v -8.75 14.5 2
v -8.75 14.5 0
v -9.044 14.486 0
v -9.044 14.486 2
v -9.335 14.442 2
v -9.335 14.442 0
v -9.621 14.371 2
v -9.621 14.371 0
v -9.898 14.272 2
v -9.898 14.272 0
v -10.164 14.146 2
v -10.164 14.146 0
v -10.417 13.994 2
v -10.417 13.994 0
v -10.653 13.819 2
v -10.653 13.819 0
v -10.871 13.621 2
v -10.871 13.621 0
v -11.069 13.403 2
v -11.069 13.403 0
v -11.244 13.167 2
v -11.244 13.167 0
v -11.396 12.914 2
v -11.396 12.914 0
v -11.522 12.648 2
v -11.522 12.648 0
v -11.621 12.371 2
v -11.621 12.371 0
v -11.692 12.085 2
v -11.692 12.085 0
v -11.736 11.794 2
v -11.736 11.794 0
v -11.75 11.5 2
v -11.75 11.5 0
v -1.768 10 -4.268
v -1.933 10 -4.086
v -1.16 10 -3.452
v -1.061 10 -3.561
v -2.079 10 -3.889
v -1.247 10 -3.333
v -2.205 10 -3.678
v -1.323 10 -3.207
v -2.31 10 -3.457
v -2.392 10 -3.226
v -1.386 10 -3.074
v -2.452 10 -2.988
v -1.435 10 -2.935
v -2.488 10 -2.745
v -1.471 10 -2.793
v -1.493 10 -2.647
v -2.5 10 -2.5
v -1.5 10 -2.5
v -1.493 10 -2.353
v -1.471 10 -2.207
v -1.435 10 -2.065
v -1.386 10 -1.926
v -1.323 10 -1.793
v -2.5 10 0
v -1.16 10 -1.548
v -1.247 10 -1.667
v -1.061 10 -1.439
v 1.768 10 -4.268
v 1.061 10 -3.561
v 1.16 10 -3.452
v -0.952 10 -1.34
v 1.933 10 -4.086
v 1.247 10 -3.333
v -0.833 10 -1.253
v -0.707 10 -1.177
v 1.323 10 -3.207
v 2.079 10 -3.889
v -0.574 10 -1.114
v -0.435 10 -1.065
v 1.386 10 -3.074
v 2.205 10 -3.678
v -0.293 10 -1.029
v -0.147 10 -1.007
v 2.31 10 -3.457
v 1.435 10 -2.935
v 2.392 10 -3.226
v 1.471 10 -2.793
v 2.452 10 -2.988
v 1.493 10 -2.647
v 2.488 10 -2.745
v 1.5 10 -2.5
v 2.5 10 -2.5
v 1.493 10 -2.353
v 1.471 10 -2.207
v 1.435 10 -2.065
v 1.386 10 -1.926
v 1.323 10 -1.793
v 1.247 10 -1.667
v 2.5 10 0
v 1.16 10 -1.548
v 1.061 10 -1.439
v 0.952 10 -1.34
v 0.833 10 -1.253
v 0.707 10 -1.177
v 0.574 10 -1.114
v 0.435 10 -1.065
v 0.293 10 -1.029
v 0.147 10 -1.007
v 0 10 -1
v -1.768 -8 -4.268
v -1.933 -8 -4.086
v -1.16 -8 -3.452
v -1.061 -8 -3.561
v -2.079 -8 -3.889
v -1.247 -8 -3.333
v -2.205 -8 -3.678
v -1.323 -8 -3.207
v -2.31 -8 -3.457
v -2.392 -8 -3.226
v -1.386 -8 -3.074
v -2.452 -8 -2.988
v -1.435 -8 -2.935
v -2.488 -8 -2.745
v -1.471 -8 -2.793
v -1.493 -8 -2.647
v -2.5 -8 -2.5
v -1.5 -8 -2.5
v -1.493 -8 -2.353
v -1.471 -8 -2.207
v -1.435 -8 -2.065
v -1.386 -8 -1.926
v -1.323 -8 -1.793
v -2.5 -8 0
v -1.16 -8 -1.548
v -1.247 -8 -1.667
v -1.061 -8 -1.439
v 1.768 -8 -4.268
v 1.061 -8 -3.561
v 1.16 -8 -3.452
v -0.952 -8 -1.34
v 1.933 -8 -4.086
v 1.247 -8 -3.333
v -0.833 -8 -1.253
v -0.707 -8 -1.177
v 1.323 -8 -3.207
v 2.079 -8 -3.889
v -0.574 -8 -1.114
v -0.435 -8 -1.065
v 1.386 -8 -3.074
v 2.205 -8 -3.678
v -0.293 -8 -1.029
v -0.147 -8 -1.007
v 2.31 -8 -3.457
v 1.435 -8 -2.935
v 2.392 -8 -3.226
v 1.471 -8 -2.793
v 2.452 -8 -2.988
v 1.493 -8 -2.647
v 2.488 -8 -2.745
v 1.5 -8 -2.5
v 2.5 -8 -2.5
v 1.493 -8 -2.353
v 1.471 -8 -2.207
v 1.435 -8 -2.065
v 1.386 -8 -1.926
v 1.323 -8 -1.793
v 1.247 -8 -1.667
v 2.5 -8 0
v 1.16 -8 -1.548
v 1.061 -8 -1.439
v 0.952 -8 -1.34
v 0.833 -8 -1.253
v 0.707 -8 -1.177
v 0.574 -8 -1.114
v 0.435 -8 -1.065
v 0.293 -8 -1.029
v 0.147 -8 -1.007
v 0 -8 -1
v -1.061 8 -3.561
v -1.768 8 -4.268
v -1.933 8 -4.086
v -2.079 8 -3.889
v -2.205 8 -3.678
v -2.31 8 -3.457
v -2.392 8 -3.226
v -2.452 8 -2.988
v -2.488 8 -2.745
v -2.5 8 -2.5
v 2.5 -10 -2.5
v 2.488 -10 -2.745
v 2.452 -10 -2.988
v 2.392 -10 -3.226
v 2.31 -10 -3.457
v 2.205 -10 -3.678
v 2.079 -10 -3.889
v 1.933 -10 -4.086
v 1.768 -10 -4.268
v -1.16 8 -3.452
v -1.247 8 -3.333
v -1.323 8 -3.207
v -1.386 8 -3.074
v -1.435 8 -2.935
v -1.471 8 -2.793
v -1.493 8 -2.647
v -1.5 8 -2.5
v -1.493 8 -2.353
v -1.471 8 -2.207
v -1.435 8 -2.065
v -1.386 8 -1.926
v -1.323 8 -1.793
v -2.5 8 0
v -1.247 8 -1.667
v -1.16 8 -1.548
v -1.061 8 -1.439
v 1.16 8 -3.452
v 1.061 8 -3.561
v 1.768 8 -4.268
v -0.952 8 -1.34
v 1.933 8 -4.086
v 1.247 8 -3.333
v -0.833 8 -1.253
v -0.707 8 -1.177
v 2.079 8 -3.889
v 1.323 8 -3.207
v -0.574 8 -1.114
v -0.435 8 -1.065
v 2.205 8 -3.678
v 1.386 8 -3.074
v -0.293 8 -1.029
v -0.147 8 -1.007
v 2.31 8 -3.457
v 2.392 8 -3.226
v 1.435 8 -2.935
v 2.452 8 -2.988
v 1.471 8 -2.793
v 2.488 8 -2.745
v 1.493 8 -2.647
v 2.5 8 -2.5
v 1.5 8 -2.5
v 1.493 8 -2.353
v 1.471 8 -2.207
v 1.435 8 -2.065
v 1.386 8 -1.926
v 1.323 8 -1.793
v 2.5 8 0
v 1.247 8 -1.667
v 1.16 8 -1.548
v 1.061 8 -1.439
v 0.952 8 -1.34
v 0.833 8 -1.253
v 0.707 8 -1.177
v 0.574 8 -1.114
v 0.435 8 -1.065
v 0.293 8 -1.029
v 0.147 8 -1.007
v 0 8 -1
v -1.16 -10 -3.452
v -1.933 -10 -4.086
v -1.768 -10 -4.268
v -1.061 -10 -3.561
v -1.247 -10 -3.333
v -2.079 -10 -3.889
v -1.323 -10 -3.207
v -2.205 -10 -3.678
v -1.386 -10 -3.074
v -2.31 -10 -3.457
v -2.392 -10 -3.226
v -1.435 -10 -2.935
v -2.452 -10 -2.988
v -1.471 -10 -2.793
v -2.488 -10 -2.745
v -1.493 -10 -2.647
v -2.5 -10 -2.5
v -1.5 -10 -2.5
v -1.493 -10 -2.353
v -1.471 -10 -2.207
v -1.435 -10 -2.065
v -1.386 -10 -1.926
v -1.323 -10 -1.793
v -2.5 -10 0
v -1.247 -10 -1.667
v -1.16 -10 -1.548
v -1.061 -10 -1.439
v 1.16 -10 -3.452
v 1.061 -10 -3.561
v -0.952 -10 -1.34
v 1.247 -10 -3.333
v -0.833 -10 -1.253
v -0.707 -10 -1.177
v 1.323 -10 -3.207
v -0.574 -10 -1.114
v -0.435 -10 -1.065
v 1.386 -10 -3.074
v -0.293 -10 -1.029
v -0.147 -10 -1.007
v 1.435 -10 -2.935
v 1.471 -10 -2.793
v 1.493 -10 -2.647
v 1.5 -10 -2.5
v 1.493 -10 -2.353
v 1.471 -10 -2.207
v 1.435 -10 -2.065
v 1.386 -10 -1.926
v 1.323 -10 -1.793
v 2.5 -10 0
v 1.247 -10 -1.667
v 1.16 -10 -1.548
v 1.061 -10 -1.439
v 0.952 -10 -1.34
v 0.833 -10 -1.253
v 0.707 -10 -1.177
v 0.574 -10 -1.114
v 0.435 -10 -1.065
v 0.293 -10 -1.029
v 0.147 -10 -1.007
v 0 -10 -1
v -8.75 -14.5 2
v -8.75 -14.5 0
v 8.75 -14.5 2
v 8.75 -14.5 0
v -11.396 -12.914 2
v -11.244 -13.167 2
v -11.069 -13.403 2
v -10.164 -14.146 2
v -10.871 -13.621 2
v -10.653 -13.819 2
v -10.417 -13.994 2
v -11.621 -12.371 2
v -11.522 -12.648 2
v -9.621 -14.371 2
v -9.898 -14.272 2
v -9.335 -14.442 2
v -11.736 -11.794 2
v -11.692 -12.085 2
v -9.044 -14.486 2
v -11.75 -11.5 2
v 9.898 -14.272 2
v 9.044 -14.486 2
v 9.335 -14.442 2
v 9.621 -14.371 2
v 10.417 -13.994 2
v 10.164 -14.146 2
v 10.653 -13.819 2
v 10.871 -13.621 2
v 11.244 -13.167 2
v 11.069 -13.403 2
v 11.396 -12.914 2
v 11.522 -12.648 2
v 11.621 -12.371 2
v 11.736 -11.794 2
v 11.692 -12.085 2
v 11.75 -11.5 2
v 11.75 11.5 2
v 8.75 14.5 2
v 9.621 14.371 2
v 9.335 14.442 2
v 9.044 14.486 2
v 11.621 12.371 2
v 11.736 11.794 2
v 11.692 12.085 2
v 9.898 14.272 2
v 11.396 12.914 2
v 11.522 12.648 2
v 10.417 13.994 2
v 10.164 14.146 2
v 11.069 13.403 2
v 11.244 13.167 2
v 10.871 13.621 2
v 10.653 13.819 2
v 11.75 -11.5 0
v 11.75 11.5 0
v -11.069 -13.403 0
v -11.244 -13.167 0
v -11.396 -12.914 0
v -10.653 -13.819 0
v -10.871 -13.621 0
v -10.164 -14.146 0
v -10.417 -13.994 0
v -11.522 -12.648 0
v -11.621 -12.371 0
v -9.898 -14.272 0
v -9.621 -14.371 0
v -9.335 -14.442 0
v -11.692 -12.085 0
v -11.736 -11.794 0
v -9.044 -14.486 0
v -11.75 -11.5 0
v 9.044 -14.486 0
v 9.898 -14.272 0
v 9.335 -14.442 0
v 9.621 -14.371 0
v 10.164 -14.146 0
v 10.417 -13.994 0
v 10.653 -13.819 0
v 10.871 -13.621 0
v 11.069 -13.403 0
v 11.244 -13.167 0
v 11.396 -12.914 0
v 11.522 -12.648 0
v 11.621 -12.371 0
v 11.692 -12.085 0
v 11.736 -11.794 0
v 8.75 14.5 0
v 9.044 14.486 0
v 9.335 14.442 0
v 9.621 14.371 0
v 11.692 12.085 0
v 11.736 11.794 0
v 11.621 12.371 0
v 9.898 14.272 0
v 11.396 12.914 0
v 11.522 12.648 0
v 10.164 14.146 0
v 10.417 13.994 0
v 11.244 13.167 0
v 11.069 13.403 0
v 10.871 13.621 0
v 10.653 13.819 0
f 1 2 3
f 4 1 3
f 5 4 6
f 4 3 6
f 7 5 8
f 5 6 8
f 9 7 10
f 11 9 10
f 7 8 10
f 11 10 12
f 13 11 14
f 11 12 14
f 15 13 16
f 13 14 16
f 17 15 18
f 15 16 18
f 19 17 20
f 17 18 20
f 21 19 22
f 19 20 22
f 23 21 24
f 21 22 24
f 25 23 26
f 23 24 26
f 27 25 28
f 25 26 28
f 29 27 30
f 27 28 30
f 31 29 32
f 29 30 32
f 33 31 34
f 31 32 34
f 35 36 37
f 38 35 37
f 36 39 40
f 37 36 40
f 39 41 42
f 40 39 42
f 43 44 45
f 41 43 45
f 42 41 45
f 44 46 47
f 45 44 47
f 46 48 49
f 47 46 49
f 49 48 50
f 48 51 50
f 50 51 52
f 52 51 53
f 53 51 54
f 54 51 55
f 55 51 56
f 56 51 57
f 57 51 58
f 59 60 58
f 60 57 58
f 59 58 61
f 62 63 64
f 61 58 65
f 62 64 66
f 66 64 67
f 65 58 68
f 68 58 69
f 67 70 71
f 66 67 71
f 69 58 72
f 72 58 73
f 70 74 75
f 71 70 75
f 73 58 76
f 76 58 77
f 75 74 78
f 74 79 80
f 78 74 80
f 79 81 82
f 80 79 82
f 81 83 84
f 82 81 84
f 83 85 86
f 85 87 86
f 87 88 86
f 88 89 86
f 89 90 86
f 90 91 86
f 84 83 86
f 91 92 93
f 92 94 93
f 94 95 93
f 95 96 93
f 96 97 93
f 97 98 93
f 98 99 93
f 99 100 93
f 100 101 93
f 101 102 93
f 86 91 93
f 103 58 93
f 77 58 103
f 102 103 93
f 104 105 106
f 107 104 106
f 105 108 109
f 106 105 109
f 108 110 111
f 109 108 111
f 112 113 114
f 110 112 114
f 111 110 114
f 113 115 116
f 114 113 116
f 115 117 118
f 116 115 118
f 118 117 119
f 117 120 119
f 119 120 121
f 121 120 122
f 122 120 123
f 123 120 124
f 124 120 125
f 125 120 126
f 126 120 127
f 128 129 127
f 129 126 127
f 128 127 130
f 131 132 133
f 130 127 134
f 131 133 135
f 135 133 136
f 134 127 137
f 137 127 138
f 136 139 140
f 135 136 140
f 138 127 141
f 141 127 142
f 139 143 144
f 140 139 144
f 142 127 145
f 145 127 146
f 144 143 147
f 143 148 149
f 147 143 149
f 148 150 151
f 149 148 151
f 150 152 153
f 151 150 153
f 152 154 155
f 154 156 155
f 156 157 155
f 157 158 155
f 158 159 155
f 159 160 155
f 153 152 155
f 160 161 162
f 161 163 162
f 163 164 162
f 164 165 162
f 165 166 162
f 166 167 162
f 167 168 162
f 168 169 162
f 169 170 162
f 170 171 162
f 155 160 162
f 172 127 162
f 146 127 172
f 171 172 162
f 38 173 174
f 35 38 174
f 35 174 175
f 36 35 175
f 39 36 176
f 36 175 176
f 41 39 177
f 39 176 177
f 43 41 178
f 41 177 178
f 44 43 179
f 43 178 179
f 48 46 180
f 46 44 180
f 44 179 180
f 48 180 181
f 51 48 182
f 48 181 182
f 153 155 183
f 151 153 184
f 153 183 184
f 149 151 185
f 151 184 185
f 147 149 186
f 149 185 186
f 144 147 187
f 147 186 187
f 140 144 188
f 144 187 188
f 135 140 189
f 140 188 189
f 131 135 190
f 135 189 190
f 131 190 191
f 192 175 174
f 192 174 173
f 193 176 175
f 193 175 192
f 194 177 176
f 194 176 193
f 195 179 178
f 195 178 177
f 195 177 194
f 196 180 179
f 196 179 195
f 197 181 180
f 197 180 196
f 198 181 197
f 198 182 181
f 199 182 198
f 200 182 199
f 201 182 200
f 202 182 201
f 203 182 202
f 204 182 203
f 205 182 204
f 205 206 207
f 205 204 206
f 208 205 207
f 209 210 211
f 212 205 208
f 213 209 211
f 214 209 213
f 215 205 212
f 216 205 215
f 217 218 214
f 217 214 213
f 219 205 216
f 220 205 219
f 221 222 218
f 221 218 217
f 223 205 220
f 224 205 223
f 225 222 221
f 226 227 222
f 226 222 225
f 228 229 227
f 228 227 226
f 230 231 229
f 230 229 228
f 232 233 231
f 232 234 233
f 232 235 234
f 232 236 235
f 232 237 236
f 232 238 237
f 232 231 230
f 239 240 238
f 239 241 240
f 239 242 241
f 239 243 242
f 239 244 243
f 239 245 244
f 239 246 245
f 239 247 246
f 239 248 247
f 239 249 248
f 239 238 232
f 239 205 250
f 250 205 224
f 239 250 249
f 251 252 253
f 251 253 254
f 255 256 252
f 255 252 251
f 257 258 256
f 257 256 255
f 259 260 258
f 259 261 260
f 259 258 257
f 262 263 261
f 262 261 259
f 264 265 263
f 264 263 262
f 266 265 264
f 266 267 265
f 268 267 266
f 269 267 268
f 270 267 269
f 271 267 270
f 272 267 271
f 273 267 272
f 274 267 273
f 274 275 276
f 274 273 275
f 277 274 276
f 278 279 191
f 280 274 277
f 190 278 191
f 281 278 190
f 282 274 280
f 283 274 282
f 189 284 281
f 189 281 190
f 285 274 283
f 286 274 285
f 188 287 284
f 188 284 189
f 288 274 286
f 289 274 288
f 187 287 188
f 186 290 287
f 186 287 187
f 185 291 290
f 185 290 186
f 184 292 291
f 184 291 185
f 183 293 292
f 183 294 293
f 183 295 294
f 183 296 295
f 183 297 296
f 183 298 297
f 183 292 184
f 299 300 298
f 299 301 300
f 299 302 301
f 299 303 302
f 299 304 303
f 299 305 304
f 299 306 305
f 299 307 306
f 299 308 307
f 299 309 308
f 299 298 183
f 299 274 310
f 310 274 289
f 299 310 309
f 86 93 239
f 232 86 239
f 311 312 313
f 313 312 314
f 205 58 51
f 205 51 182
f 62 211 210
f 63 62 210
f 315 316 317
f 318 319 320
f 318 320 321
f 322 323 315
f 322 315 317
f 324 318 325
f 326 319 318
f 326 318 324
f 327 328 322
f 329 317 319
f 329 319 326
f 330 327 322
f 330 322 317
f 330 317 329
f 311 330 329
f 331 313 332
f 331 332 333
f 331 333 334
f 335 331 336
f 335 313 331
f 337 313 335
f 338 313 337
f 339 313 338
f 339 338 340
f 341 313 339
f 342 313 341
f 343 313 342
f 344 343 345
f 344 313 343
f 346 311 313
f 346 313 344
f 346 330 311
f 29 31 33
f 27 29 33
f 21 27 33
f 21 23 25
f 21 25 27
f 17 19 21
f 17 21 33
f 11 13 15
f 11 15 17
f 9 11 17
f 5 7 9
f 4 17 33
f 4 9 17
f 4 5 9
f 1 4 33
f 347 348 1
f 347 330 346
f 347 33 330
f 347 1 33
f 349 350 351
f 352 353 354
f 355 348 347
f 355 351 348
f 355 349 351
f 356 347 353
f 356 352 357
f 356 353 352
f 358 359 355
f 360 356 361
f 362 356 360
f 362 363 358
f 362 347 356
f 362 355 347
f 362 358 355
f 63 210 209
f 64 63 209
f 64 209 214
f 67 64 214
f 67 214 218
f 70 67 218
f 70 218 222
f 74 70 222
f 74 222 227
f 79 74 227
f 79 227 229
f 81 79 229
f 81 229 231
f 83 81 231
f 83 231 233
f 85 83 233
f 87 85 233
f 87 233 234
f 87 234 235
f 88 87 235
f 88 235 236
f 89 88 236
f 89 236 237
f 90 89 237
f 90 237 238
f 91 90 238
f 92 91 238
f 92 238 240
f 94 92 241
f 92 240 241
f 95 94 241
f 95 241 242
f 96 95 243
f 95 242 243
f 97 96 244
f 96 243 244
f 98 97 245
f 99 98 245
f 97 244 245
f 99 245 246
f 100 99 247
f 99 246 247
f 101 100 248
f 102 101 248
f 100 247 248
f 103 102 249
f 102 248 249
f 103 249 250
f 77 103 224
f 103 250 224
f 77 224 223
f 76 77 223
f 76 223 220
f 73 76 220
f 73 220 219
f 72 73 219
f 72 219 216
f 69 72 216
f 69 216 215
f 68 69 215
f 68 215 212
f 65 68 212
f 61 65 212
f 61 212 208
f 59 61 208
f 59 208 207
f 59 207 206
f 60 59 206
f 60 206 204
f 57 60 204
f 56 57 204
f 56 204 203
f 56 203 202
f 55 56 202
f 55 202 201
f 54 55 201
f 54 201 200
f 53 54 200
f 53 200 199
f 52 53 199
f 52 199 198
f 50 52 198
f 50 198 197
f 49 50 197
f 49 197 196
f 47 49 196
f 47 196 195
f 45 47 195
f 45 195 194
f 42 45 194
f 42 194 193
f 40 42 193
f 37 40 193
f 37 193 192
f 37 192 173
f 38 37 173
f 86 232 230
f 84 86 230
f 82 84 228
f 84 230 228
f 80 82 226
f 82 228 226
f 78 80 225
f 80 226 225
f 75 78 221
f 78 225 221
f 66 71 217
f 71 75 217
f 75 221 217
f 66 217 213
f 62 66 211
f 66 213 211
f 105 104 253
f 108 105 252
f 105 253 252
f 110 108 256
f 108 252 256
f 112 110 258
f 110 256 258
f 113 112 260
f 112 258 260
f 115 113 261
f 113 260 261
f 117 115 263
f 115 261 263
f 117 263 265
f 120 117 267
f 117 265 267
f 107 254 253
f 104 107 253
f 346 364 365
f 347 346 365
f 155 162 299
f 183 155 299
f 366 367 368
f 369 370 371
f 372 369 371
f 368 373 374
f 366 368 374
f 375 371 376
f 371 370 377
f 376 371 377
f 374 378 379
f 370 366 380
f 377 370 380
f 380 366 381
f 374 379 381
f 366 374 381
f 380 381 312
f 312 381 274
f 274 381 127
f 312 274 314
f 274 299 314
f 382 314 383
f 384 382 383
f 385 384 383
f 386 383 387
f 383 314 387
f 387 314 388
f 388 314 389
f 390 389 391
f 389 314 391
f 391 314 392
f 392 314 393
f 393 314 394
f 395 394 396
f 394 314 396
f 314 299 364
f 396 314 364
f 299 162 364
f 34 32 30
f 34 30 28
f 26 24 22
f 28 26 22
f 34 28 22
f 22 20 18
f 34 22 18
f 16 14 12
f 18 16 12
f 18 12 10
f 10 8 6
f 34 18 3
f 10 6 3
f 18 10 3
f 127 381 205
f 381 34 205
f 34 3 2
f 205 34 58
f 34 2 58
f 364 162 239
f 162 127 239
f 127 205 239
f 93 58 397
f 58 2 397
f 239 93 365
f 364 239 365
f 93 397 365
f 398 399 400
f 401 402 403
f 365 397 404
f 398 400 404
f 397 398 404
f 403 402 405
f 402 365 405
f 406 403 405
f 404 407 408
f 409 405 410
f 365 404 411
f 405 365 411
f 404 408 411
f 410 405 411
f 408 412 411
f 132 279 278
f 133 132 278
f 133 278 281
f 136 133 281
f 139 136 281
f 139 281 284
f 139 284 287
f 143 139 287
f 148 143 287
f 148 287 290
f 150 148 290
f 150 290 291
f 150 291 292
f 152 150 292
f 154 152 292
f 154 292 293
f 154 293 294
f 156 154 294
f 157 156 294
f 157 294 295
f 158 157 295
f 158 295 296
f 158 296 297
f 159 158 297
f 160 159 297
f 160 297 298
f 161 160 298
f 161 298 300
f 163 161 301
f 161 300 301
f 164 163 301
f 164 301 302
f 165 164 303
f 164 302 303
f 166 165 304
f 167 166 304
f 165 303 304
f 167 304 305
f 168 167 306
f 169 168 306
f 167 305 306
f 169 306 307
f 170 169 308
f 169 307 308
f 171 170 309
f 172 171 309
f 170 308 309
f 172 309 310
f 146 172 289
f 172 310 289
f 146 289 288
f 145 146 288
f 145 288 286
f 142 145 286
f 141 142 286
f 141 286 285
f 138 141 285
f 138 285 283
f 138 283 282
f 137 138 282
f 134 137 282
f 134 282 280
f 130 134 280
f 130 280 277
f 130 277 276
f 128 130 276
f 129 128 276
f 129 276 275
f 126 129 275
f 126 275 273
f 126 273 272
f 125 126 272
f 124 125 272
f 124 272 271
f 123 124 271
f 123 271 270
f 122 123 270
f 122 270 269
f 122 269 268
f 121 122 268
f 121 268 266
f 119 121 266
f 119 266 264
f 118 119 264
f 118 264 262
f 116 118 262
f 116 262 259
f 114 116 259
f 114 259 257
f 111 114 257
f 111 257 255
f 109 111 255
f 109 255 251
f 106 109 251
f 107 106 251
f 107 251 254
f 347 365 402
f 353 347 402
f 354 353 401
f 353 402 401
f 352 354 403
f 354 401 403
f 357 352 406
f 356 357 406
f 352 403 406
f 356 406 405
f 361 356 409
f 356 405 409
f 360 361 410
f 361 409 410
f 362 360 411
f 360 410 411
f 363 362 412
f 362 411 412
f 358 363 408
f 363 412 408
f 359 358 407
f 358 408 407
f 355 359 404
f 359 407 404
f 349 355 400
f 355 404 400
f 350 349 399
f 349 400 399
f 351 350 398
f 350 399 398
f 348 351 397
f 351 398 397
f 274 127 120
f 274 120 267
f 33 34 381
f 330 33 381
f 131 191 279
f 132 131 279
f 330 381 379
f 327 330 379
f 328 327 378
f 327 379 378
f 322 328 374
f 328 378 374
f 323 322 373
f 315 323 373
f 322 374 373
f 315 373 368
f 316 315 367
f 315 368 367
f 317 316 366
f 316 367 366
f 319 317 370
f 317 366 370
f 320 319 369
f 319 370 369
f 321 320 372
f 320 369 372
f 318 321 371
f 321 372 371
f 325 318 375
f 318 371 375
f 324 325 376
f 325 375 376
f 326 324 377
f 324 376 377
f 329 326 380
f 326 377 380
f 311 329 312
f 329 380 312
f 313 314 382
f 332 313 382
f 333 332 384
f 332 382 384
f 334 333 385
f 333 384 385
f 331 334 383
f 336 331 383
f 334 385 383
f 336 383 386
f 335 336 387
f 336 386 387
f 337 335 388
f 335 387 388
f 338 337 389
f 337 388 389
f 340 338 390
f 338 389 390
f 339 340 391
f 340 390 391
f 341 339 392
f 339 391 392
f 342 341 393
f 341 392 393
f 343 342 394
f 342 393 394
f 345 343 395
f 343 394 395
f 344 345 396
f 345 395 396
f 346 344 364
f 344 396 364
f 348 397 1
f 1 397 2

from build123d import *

# Parameters (mm, degrees)
F1_DEPTH = 2
F2_W     = 5
F2_H     = 2
F3_DEPTH = 5
F5_DEPTH = 25


with BuildPart() as f1:
    # F0 (on Top) → F1 (new body)
    with BuildSketch(Plane.XY):
        with BuildLine():
            Line((-8.75, -14.5), (8.75, -14.5))
            ThreePointArc((8.75, -14.5), (10.87132, -13.62132), (11.75, -11.5))
            Line((11.75, -11.5), (11.75, 11.5))
            ThreePointArc((11.75, 11.5), (10.87132, 13.62132), (8.75, 14.5))
            Line((8.75, 14.5), (-8.75, 14.5))
            ThreePointArc((-8.75, 14.5), (-10.87132, 13.62132), (-11.75, 11.5))
            Line((-11.75, 11.5), (-11.75, -11.5))
            ThreePointArc((-11.75, -11.5), (-10.87132, -13.62132), (-8.75, -14.5))
        make_face()
    extrude(amount=F1_DEPTH)

    # F2 (on face) → F3 (join)
    with BuildSketch(Plane(origin=(0, 0, 0), x_dir=(1, 0, 0), z_dir=(0, 0, -1))):
        with Locations((0, 9)):
            Rectangle(F2_W, F2_H)
        with Locations((0, -9)):
            Rectangle(F2_W, F2_H)
    extrude(amount=F3_DEPTH)

    # F4 (on face) → F5 (cut)
    with BuildSketch(Plane.XZ.offset(10)):
        with BuildLine():
            ThreePointArc((2.5, -2.5), (2.309699, -3.456709), (1.767767, -4.267767))
            Line((1.767767, -4.267767), (1.06066, -3.56066))
            ThreePointArc((1.06066, -3.56066), (0, -1), (-1.06066, -3.56066))
            Line((-1.06066, -3.56066), (-1.767767, -4.267767))
            ThreePointArc((-1.767767, -4.267767), (-2.309699, -3.456709), (-2.5, -2.5))
            Line((-2.5, -2.5), (-2.5, -5))
            Line((-2.5, -5), (2.5, -5))
            Line((2.5, -5), (2.5, -2.5))
        make_face()
        Polygon((3.523229, -2.854811), (2.5, -2.5), (2.5, -5), (-2.5, -5), (-2.5, -2.5), (-3.529894, -2.823659), (-4.289252, -6.509164), (2.408858, -5.650775), (4.006271, -4.421826), align=None)
    extrude(amount=-F5_DEPTH, mode=Mode.SUBTRACT)


solid = f1.part
